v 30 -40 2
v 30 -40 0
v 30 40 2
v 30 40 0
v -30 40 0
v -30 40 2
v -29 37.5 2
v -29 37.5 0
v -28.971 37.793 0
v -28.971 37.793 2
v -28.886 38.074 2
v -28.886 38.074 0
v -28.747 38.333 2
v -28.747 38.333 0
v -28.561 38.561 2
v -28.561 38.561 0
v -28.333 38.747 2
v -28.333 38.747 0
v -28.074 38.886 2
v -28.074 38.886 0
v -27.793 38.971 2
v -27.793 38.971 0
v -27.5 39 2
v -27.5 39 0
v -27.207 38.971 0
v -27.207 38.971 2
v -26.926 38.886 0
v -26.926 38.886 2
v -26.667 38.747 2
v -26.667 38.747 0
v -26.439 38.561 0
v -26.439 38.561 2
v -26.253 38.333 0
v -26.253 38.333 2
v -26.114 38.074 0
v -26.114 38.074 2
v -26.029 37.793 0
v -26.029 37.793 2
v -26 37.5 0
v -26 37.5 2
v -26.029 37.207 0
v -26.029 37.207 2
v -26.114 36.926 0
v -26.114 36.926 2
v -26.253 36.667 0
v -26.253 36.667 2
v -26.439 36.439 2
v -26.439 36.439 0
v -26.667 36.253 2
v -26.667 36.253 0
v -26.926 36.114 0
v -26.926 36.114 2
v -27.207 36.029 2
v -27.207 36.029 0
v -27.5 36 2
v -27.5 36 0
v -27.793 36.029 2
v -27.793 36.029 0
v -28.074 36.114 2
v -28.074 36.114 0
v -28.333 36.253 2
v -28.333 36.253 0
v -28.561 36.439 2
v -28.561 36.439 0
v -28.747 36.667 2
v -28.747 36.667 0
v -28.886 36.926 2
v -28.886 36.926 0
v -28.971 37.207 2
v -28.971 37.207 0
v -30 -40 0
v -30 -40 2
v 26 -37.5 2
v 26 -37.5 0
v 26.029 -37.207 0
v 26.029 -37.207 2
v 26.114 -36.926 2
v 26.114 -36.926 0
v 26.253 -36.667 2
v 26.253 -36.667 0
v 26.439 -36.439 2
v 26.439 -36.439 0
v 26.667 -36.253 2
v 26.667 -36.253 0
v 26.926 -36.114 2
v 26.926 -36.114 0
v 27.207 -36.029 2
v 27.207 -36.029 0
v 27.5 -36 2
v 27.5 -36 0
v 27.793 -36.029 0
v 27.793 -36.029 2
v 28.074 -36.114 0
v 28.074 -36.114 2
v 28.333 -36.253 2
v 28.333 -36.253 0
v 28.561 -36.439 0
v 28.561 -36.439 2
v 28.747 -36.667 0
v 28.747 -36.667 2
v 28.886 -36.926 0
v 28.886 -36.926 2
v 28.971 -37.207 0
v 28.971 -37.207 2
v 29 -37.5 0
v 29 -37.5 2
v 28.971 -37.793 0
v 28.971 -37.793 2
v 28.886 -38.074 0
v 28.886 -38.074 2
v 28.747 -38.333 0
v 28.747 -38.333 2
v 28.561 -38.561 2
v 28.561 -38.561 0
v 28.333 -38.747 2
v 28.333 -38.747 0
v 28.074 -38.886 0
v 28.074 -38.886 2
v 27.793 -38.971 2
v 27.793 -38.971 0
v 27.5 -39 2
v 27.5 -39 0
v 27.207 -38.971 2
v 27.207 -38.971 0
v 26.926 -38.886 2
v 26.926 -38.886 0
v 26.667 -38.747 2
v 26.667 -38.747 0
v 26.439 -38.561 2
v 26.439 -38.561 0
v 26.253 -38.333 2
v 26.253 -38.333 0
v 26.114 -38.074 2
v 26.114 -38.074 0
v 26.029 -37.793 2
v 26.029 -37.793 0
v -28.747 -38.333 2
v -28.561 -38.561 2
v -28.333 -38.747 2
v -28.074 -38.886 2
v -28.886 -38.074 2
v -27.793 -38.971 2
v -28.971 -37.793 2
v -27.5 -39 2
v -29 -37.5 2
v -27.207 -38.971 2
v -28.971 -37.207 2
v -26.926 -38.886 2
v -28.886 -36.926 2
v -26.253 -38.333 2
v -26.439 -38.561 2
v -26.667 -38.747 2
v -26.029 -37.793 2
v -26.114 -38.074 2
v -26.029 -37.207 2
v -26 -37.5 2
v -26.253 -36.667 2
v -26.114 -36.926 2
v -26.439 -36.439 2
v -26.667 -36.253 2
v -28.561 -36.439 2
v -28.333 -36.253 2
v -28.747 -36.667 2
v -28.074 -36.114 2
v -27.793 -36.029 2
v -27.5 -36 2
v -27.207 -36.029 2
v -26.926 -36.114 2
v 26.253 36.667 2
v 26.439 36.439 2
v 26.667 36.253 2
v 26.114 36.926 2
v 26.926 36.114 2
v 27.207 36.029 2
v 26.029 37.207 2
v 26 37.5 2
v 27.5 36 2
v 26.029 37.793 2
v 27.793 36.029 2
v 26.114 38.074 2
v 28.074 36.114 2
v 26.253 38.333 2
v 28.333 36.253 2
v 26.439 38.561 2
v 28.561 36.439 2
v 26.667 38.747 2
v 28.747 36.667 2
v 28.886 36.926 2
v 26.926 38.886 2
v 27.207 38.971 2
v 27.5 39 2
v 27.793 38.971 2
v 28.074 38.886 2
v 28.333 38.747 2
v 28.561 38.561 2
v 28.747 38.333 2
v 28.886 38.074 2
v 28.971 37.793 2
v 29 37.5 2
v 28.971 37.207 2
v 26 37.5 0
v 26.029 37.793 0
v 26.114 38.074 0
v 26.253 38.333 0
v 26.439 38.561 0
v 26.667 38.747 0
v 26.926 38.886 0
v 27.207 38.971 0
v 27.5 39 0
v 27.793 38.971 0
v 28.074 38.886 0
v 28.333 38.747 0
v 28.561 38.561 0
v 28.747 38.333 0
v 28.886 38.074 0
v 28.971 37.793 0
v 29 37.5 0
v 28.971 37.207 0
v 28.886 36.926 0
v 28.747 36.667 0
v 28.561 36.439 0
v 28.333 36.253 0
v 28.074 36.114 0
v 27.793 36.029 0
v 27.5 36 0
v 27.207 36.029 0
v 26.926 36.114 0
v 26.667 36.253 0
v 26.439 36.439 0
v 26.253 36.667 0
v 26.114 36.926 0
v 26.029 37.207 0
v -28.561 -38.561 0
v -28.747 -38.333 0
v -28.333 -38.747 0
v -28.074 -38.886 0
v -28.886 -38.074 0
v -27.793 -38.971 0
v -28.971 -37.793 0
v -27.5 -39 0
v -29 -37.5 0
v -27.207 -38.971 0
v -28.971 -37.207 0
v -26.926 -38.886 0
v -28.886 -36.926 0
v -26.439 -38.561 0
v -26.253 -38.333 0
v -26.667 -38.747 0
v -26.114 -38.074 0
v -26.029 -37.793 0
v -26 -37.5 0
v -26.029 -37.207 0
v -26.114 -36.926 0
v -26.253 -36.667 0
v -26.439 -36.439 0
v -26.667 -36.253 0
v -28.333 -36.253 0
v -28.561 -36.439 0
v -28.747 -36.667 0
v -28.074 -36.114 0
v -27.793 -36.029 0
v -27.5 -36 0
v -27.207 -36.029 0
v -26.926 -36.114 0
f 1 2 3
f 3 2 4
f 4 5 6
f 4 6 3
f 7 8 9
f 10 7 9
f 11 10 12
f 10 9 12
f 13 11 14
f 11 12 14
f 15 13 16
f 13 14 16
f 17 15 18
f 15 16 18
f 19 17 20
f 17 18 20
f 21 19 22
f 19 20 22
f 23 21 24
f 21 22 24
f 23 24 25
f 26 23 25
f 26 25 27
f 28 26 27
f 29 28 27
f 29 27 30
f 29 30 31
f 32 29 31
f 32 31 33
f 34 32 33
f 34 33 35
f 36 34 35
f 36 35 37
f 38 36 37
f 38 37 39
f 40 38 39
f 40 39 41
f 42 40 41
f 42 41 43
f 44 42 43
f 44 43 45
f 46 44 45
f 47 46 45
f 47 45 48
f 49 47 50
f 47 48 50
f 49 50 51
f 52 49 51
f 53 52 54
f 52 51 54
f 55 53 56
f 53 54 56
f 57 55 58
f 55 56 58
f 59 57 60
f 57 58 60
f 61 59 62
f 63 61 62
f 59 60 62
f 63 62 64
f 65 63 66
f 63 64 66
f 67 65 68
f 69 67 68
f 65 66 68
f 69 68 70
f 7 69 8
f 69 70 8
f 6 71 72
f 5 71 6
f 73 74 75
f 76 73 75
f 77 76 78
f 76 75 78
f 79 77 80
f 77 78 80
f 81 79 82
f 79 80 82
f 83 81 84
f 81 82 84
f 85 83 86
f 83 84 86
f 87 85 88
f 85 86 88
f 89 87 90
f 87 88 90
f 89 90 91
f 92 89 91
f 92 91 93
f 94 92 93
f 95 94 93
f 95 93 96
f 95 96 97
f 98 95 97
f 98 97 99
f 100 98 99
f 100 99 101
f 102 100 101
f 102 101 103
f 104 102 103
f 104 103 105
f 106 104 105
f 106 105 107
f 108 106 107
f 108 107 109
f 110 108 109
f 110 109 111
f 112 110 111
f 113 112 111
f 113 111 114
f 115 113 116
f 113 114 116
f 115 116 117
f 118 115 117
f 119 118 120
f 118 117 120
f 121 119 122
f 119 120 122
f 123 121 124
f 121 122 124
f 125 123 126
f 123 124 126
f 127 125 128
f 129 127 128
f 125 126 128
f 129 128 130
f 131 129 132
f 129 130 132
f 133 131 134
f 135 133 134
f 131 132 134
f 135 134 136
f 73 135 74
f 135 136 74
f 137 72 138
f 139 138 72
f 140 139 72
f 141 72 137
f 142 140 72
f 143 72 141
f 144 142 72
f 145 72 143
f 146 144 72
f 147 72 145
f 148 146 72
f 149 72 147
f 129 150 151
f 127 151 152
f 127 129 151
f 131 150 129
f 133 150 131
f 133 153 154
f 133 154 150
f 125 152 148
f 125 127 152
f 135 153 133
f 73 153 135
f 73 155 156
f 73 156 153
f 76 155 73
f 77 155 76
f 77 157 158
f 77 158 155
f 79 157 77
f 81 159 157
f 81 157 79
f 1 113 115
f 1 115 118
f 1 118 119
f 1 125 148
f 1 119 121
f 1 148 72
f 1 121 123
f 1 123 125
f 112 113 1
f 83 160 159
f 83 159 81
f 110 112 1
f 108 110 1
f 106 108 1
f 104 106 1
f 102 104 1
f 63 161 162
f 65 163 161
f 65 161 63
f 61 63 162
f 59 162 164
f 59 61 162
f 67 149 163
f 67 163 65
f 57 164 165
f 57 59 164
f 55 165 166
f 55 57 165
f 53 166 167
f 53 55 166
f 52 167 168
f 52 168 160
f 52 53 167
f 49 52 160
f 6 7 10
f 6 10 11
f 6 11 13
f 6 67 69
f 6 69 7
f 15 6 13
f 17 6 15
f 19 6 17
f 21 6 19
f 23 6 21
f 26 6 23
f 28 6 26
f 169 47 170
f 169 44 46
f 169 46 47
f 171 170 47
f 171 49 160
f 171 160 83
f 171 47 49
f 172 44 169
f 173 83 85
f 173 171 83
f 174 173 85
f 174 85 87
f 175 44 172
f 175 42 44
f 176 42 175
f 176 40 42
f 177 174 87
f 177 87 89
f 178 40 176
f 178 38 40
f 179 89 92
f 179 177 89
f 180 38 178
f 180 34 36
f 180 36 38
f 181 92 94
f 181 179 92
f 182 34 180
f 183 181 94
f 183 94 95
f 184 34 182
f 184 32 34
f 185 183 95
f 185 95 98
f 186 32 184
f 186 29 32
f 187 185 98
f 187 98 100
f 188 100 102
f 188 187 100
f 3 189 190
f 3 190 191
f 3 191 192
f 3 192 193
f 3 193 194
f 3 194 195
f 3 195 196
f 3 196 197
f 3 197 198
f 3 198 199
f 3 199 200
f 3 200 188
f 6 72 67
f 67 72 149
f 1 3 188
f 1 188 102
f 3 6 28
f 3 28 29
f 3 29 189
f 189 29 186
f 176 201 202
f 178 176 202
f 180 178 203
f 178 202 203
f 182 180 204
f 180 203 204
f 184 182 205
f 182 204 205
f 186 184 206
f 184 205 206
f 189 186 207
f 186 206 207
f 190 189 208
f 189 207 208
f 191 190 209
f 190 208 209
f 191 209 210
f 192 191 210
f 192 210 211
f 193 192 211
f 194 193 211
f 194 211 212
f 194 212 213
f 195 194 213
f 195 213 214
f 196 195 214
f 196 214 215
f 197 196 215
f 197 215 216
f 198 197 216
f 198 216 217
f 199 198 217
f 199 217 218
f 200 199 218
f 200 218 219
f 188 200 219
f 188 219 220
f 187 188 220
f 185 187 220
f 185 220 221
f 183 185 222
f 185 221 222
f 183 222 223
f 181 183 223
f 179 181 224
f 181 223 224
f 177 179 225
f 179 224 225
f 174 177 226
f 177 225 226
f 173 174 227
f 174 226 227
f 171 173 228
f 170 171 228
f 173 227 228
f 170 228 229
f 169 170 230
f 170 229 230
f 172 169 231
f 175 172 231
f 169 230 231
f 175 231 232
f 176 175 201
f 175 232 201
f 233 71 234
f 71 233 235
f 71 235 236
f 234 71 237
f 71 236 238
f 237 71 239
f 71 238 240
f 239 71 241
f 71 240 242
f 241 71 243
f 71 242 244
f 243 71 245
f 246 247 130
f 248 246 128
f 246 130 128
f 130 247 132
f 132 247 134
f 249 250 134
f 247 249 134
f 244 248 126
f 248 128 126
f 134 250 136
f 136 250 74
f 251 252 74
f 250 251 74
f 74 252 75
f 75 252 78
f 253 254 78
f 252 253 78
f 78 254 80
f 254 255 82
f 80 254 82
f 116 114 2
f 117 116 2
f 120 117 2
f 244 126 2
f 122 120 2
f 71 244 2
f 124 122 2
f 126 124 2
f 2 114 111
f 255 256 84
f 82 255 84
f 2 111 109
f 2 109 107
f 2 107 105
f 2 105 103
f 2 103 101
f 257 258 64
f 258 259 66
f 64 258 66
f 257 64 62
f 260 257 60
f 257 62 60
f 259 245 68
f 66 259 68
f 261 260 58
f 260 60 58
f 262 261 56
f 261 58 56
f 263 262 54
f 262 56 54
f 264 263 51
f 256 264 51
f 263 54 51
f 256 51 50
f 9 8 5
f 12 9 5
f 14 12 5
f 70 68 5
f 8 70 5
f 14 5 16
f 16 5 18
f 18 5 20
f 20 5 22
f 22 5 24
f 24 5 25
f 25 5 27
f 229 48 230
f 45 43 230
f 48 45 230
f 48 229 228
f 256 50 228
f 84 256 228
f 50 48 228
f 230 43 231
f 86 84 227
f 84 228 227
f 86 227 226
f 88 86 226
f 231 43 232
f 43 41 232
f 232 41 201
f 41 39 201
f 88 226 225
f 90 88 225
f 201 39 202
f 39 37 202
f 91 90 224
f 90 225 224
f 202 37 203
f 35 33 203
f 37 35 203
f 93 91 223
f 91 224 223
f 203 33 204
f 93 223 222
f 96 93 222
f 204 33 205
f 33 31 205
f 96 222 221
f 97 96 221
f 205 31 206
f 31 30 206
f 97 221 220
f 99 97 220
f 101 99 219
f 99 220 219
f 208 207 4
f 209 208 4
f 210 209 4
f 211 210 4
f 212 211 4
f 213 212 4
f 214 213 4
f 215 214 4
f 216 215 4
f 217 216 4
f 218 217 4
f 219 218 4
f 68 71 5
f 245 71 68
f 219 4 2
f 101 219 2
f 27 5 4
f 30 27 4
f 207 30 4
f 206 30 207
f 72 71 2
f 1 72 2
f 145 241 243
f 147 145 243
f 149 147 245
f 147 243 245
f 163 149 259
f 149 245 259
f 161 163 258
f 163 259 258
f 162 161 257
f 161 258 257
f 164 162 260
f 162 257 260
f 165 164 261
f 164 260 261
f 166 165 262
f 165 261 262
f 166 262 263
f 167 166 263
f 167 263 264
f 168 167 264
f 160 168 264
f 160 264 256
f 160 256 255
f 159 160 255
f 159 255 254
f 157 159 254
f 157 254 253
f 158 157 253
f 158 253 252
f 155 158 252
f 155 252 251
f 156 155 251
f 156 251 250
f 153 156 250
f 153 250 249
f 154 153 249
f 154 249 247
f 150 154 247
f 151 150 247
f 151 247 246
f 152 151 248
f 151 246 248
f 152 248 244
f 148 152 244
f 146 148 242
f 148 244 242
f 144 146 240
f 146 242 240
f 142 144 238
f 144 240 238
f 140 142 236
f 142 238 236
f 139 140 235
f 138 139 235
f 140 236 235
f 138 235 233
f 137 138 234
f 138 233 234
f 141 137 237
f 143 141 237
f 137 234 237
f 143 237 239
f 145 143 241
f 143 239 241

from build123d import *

# Parameters (mm, degrees)
CROQUIS1_W              = 60
CROQUIS1_H              = 80
SALIENTE_EXTRUIR1_DEPTH = 2
CORTAR_EXTRUIR1_REACH   = 4
CROQUIS2_R              = 1.5


with BuildPart() as part:
    # Croquis1 → Saliente-Extruir1 (new body)
    with BuildSketch(Plane.XY):
        Rectangle(CROQUIS1_W, CROQUIS1_H)
    extrude(amount=SALIENTE_EXTRUIR1_DEPTH)

    # Croquis2 → Cortar-Extruir1 (cut, up to next)
    with BuildSketch(Plane(origin=(0, 0, 0), x_dir=(-1, 0, 0), z_dir=(0, 0, -1)), mode=Mode.PRIVATE) as cortar_extruir1_sk1:
        with Locations((27.5, -37.5)):
            Circle(CROQUIS2_R)
    cortar_extruir1_tool1 = extrude(cortar_extruir1_sk1.sketch, amount=-CORTAR_EXTRUIR1_REACH, mode=Mode.PRIVATE) & part.part
    add(cortar_extruir1_tool1.solids().sort_by_distance((-27.5, -37.5, 0))[0], mode=Mode.SUBTRACT)
    # Croquis2 → Cortar-Extruir1 (cut, up to next)
    with BuildSketch(Plane(origin=(0, 0, 0), x_dir=(-1, 0, 0), z_dir=(0, 0, -1)), mode=Mode.PRIVATE) as cortar_extruir1_sk2:
        with Locations((-27.5, -37.5)):
            Circle(CROQUIS2_R)
    cortar_extruir1_tool2 = extrude(cortar_extruir1_sk2.sketch, amount=-CORTAR_EXTRUIR1_REACH, mode=Mode.PRIVATE) & part.part
    add(cortar_extruir1_tool2.solids().sort_by_distance((27.5, -37.5, 0))[0], mode=Mode.SUBTRACT)
    # Croquis2 → Cortar-Extruir1 (cut, up to next)
    with BuildSketch(Plane(origin=(0, 0, 0), x_dir=(-1, 0, 0), z_dir=(0, 0, -1)), mode=Mode.PRIVATE) as cortar_extruir1_sk3:
        with Locations((-27.5, 37.5)):
            Circle(CROQUIS2_R)
    cortar_extruir1_tool3 = extrude(cortar_extruir1_sk3.sketch, amount=-CORTAR_EXTRUIR1_REACH, mode=Mode.PRIVATE) & part.part
    add(cortar_extruir1_tool3.solids().sort_by_distance((27.5, 37.5, 0))[0], mode=Mode.SUBTRACT)
    # Croquis2 → Cortar-Extruir1 (cut, up to next)
    with BuildSketch(Plane(origin=(0, 0, 0), x_dir=(-1, 0, 0), z_dir=(0, 0, -1)), mode=Mode.PRIVATE) as cortar_extruir1_sk4:
        with Locations((27.5, 37.5)):
            Circle(CROQUIS2_R)
    cortar_extruir1_tool4 = extrude(cortar_extruir1_sk4.sketch, amount=-CORTAR_EXTRUIR1_REACH, mode=Mode.PRIVATE) & part.part
    add(cortar_extruir1_tool4.solids().sort_by_distance((-27.5, 37.5, 0))[0], mode=Mode.SUBTRACT)


solid = part.part
